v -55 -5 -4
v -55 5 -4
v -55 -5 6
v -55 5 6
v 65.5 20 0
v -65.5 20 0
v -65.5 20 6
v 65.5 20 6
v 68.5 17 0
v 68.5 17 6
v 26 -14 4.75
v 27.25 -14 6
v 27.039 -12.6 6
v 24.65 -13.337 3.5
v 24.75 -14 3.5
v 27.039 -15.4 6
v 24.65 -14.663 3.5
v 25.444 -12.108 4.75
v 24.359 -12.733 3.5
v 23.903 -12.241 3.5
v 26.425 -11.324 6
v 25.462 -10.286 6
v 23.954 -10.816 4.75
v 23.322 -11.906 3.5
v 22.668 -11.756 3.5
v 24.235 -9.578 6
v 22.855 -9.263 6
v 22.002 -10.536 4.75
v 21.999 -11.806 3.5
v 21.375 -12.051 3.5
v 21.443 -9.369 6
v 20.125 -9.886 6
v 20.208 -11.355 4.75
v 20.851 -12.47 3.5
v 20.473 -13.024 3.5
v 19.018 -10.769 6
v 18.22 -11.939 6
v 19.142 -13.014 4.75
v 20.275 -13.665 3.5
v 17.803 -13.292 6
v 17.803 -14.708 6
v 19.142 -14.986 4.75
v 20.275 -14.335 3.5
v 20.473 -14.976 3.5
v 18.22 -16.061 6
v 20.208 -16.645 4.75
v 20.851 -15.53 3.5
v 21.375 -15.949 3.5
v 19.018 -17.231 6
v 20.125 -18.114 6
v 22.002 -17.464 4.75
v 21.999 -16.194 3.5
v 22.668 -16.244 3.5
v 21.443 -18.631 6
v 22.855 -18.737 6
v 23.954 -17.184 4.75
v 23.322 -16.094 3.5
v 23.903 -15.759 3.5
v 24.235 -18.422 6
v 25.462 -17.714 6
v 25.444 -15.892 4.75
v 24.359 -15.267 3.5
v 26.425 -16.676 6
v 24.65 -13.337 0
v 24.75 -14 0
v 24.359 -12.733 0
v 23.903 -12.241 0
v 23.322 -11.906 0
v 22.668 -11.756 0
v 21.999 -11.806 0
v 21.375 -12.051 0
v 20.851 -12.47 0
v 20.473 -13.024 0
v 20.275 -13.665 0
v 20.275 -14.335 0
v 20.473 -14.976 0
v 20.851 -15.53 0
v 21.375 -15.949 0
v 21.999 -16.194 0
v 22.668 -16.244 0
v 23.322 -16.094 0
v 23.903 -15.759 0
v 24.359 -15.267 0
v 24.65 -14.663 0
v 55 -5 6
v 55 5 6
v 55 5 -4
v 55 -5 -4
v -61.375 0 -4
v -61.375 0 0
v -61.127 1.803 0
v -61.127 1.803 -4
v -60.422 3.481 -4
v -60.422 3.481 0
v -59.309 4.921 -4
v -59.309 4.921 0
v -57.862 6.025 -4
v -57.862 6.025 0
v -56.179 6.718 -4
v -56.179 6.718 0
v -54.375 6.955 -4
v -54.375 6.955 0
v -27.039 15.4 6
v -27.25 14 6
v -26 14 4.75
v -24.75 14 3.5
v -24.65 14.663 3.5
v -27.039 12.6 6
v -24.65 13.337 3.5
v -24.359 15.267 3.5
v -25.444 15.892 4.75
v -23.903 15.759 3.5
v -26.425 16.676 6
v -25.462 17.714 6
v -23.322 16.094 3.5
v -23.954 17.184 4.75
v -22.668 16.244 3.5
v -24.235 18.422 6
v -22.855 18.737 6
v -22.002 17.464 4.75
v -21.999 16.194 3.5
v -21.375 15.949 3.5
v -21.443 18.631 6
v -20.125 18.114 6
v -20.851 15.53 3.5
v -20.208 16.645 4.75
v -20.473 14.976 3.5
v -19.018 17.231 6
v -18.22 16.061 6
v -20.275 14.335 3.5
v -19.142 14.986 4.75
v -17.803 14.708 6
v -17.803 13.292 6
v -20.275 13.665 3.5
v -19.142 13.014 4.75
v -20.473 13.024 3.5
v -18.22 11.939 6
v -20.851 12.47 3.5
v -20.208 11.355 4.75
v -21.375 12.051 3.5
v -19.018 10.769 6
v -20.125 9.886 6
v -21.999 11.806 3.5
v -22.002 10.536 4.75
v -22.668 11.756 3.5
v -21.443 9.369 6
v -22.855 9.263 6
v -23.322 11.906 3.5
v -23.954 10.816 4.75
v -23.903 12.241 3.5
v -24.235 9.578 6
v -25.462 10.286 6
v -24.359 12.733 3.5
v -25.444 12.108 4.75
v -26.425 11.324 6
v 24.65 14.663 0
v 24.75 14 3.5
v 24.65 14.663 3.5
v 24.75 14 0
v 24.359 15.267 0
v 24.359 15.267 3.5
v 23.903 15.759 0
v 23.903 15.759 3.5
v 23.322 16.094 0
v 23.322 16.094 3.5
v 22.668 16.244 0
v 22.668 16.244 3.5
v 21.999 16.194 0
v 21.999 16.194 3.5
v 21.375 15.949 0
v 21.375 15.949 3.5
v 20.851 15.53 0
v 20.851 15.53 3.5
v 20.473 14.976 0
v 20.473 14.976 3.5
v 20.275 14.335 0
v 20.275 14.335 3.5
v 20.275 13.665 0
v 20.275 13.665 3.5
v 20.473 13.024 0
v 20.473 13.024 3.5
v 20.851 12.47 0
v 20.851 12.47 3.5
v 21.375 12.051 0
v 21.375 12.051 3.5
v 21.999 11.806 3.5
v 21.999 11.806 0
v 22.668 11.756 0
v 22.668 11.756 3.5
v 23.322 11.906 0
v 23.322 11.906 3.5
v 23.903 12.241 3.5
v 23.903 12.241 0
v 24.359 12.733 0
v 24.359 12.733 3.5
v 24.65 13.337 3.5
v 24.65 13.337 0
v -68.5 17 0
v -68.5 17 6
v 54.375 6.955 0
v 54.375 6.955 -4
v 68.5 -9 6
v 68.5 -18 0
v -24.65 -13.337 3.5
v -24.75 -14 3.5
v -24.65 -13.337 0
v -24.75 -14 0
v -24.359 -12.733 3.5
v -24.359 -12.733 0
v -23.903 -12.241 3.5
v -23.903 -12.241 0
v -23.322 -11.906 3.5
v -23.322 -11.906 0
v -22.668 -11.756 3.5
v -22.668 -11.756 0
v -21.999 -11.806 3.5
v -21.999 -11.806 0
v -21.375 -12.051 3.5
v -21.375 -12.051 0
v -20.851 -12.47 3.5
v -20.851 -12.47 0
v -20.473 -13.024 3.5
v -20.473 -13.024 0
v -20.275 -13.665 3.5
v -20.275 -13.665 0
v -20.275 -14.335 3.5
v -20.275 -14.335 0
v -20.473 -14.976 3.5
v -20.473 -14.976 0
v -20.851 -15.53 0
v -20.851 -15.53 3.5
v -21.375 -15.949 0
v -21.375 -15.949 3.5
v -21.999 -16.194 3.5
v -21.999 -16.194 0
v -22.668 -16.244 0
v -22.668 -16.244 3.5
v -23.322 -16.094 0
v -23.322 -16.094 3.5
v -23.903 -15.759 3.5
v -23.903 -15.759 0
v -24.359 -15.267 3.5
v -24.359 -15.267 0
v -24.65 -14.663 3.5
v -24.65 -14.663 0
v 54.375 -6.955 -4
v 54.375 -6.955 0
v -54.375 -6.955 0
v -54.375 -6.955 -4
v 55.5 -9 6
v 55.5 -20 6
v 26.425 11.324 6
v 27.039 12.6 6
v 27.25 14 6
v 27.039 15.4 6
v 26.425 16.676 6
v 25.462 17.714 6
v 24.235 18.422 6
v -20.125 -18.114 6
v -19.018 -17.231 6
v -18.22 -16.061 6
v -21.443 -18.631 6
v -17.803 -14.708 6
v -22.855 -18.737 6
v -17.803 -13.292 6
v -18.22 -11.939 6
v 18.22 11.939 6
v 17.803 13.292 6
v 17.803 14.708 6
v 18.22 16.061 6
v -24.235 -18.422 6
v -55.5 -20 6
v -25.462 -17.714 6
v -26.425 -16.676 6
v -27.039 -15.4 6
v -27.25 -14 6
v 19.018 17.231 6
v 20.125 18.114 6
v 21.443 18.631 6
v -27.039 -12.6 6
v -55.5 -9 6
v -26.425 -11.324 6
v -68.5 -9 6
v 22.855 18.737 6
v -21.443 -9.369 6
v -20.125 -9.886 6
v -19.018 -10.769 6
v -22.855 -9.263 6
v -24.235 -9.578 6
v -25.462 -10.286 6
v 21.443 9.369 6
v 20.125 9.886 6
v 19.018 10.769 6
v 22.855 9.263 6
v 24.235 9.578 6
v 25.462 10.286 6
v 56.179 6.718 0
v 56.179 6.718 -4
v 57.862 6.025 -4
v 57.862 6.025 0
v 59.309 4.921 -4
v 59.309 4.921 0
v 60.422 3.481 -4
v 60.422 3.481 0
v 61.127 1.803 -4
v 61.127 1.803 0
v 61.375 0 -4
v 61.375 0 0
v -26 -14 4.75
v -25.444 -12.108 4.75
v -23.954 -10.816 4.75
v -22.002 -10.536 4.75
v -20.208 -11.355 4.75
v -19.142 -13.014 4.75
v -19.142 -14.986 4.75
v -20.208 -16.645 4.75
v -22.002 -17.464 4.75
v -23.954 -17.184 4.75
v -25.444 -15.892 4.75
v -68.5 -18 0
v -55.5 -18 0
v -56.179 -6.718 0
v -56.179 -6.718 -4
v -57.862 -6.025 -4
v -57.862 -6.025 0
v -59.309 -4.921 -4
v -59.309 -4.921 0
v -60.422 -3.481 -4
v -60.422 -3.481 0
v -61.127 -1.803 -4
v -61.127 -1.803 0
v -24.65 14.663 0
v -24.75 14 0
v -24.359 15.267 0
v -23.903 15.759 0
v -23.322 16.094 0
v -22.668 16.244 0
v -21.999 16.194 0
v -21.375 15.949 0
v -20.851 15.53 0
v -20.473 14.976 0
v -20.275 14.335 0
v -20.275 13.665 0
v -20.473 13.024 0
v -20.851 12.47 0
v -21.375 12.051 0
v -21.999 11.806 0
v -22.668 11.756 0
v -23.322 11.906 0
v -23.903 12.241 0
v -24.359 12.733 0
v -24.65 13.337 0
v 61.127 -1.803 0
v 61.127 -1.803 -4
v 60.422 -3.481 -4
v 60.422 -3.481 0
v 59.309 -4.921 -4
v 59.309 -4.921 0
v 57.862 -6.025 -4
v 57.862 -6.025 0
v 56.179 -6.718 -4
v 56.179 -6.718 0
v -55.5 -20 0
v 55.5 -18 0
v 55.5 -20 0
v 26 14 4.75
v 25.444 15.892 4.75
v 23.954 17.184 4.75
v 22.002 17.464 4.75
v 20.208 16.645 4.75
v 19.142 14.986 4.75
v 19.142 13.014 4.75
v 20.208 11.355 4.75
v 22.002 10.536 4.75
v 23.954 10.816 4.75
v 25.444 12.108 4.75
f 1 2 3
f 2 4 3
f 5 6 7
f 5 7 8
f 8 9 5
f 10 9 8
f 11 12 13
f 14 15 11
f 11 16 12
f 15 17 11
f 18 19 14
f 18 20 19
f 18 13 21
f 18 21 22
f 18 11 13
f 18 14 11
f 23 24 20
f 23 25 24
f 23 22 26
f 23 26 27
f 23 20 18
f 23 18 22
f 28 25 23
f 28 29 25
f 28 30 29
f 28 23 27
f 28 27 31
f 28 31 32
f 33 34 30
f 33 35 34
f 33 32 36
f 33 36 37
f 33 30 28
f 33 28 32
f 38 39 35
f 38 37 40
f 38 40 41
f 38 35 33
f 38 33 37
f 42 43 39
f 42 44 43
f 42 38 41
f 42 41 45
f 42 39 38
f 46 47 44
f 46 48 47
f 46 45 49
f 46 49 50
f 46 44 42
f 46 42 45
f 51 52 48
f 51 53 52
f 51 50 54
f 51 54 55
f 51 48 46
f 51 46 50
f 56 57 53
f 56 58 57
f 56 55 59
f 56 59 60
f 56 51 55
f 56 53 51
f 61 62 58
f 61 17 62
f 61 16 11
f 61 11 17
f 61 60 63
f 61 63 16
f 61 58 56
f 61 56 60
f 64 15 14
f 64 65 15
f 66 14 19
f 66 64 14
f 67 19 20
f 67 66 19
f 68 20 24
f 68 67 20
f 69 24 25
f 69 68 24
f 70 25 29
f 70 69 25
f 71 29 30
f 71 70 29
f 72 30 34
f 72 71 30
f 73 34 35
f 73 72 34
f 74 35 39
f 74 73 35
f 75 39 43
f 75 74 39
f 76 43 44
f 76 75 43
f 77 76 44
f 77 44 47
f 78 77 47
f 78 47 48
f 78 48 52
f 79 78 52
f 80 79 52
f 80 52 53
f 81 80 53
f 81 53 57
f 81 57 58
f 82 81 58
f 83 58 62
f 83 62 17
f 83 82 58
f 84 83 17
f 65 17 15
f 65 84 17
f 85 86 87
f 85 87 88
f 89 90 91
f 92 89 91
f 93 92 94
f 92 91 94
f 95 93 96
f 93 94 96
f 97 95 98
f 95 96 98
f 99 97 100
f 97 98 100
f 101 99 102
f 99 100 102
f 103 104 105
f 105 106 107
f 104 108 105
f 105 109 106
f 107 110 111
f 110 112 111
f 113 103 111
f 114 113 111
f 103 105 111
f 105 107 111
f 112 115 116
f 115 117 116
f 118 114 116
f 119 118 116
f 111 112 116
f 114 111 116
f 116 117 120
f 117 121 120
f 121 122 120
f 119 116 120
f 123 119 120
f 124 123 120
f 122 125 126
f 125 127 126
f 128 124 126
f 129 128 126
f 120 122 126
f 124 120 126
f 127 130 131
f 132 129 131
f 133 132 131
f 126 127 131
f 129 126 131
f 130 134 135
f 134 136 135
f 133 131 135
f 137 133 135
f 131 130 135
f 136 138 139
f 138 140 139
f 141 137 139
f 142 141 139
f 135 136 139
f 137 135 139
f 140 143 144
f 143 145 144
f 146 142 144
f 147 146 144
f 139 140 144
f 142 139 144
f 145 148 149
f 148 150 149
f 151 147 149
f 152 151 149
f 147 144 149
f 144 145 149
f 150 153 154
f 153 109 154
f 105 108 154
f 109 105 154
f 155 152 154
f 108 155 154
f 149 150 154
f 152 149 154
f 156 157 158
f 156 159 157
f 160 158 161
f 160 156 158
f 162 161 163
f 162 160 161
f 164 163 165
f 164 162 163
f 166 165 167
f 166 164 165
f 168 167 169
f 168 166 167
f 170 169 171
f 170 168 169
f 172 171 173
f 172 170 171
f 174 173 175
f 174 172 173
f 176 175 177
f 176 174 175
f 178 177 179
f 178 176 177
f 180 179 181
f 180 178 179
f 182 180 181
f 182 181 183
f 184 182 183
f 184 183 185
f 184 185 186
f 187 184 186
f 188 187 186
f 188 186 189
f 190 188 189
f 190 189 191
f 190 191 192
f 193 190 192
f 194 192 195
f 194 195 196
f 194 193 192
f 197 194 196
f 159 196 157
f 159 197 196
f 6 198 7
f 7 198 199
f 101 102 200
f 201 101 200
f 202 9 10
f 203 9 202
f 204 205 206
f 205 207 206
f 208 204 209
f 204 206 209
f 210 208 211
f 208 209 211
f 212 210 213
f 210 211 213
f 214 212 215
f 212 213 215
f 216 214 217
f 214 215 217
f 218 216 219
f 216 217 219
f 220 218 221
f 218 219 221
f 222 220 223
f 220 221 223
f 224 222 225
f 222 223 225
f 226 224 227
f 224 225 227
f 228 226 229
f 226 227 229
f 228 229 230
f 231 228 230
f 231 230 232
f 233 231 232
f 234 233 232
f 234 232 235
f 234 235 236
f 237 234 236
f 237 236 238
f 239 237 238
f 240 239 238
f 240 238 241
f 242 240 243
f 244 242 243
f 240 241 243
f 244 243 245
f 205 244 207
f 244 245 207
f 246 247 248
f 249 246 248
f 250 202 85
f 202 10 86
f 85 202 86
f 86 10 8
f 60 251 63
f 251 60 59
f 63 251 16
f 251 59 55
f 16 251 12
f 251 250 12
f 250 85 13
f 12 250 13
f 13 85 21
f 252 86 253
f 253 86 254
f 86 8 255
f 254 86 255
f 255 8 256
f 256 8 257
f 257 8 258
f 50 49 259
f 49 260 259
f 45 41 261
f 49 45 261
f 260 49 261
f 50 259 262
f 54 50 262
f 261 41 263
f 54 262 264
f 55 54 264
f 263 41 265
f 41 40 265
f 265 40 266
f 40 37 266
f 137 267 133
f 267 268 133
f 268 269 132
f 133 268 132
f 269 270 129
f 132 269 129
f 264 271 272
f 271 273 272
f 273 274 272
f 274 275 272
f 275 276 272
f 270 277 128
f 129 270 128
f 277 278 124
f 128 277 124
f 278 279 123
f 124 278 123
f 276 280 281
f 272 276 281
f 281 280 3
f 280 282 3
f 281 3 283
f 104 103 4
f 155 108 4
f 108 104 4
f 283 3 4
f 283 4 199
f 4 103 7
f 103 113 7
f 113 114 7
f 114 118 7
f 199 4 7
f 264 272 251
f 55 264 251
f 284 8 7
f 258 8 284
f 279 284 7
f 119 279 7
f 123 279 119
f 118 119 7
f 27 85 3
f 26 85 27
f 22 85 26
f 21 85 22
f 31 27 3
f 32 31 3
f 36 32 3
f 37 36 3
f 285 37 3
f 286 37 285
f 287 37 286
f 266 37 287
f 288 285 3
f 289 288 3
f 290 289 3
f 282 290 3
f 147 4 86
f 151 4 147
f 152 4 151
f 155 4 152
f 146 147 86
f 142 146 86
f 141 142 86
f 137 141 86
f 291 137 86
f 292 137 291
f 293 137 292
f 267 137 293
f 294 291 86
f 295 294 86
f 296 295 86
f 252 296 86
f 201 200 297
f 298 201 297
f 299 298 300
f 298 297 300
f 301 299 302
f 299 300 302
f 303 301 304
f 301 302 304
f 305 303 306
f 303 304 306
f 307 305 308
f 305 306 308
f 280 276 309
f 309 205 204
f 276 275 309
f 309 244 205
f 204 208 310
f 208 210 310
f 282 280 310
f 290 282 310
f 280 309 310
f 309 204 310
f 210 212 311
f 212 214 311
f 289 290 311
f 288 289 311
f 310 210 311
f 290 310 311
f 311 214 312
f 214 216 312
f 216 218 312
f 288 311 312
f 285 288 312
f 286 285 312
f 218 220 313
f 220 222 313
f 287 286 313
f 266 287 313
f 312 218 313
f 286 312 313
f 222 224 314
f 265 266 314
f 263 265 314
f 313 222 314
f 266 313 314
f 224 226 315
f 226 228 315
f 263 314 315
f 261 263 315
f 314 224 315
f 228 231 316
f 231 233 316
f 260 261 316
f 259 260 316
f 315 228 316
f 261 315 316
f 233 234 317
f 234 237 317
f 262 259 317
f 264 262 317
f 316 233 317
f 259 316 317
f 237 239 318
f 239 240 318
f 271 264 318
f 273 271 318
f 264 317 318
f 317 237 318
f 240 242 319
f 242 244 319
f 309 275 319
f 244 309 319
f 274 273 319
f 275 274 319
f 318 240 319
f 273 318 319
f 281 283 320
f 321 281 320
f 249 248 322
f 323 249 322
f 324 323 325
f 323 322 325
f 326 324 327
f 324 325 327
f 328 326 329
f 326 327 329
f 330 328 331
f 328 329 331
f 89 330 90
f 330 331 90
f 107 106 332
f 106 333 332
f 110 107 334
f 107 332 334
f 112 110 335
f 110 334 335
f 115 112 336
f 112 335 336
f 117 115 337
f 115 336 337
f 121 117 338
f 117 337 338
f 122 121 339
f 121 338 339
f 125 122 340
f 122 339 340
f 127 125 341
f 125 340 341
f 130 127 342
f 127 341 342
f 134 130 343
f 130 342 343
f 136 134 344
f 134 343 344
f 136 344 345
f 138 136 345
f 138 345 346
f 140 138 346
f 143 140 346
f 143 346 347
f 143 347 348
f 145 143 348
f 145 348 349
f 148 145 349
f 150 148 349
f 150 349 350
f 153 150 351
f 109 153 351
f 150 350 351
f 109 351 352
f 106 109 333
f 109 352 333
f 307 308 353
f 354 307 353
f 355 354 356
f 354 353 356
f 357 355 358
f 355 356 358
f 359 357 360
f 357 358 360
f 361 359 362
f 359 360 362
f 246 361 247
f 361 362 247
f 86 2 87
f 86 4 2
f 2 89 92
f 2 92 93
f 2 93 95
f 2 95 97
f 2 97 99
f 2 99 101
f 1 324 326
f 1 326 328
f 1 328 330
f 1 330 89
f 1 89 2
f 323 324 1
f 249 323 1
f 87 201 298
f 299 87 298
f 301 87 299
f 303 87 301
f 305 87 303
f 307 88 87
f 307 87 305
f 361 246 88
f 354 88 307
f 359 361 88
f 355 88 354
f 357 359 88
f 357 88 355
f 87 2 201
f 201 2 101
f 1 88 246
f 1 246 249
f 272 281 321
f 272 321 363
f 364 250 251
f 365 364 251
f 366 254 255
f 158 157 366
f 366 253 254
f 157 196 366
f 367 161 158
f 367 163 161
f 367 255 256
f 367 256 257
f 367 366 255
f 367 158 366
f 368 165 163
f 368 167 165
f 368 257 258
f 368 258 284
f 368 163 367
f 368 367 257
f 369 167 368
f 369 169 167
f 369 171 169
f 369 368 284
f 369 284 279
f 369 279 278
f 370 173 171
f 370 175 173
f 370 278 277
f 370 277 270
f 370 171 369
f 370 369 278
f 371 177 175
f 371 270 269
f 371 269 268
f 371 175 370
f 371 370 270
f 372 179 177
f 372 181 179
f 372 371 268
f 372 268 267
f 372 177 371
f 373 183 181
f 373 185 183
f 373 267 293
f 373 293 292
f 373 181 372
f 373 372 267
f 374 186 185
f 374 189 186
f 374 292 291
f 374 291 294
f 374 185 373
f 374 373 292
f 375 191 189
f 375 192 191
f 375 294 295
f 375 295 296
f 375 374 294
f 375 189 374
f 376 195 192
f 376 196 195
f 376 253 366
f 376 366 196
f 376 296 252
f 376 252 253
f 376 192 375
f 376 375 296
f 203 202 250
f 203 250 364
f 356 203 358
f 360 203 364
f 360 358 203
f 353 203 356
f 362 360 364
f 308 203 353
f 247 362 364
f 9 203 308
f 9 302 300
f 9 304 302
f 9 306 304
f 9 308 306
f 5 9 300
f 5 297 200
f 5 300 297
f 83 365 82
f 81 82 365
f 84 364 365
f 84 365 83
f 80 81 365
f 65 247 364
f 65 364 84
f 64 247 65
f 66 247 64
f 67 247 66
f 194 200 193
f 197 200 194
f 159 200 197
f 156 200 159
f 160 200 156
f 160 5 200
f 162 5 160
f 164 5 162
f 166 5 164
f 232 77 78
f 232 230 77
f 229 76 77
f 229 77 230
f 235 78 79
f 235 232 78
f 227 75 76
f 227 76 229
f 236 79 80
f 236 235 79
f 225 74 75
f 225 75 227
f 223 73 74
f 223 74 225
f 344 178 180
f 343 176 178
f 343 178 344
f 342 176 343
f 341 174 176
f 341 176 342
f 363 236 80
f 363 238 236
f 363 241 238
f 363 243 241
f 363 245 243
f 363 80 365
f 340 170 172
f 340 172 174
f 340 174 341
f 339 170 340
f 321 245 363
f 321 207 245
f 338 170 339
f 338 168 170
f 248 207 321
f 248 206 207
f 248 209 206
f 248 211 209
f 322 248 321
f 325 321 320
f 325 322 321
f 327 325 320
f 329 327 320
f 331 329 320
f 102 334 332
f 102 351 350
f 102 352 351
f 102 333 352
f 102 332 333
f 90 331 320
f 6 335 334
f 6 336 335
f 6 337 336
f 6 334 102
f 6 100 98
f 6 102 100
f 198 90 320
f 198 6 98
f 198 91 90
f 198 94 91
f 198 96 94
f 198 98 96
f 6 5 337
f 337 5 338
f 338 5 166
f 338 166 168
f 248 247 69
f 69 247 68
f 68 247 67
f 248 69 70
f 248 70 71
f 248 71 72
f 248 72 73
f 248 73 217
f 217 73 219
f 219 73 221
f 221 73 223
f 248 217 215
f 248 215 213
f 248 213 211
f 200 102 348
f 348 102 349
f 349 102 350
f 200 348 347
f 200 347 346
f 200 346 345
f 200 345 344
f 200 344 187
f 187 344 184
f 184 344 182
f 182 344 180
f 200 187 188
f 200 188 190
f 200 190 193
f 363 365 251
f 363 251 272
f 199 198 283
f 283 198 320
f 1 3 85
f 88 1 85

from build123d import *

# Parameters (mm, degrees)
F1_DEPTH       = 6
F3_DEPTH       = 13
F5_D           = 4.5
F5_CSINK_D     = 9.5
F5_CSINK_ANGLE = 90
F7_W           = 110
F7_H           = 10
F8_DEPTH       = 4
F9_SIZE        = 3


with BuildPart() as f1:
    # F0 (on Top) → F1 (new body)
    with BuildSketch(Plane.XY):
        Polygon((0, 20), (-68.5, 20), (-68.5, -20), (0, -20), (0, -5), (-55, -5), (-55, 5), (0, 5), align=None)
    extrude(amount=F1_DEPTH)

    # F2 (on face) → F3 (cut)
    with BuildSketch(Plane(origin=(-68.5, 0, 0), x_dir=(0, -1, 0), z_dir=(-1, 0, 0))):
        Polygon((20, 0), (20, 6), (9, 6), (18, 0), align=None)
    extrude(amount=-F3_DEPTH, mode=Mode.SUBTRACT)

    # F5 (through all)
    with Locations(Plane.XY.offset(6)):
        with Locations((-22.5, 14), (-22.5, -14)):
            CounterSinkHole(F5_D / 2, F5_CSINK_D / 2, counter_sink_angle=F5_CSINK_ANGLE)

    # F6: F1 across plane


with BuildPart() as f1_1:
    add(f1.part)
    add(f1.part.mirror(Plane.YZ))

    # F7 (on face) → F8 (join)
    with BuildSketch(Plane(origin=(0, 0, 0), x_dir=(1, 0, 0), z_dir=(0, 0, -1))):
        with BuildLine():
            Line((54.375, 6.955), (-54.375, 6.955))
            ThreePointArc((-54.375, 6.955), (-59.3088119137, 4.9206318833), (-61.3748553556, 0))
            ThreePointArc((-61.3748553556, 0), (-59.3088119137, -4.9206318833), (-54.375, -6.955))
            Line((-54.375, -6.955), (54.375, -6.955))
            ThreePointArc((54.375, -6.955), (59.3088119137, -4.9206318833), (61.3748553556, 0))
            ThreePointArc((61.3748553556, 0), (59.3088119137, 4.9206318833), (54.375, 6.955))
        make_face()
        Rectangle(F7_W, F7_H, mode=Mode.SUBTRACT)
    extrude(amount=F8_DEPTH)

    # F9
    f9_edges = [f1_1.edges().sort_by_distance(p)[0] for p in [
        (-68.5, 20, 3),
        (68.5, 20, 3),
    ]]
    chamfer(f9_edges, length=F9_SIZE)


solid = f1_1.part
